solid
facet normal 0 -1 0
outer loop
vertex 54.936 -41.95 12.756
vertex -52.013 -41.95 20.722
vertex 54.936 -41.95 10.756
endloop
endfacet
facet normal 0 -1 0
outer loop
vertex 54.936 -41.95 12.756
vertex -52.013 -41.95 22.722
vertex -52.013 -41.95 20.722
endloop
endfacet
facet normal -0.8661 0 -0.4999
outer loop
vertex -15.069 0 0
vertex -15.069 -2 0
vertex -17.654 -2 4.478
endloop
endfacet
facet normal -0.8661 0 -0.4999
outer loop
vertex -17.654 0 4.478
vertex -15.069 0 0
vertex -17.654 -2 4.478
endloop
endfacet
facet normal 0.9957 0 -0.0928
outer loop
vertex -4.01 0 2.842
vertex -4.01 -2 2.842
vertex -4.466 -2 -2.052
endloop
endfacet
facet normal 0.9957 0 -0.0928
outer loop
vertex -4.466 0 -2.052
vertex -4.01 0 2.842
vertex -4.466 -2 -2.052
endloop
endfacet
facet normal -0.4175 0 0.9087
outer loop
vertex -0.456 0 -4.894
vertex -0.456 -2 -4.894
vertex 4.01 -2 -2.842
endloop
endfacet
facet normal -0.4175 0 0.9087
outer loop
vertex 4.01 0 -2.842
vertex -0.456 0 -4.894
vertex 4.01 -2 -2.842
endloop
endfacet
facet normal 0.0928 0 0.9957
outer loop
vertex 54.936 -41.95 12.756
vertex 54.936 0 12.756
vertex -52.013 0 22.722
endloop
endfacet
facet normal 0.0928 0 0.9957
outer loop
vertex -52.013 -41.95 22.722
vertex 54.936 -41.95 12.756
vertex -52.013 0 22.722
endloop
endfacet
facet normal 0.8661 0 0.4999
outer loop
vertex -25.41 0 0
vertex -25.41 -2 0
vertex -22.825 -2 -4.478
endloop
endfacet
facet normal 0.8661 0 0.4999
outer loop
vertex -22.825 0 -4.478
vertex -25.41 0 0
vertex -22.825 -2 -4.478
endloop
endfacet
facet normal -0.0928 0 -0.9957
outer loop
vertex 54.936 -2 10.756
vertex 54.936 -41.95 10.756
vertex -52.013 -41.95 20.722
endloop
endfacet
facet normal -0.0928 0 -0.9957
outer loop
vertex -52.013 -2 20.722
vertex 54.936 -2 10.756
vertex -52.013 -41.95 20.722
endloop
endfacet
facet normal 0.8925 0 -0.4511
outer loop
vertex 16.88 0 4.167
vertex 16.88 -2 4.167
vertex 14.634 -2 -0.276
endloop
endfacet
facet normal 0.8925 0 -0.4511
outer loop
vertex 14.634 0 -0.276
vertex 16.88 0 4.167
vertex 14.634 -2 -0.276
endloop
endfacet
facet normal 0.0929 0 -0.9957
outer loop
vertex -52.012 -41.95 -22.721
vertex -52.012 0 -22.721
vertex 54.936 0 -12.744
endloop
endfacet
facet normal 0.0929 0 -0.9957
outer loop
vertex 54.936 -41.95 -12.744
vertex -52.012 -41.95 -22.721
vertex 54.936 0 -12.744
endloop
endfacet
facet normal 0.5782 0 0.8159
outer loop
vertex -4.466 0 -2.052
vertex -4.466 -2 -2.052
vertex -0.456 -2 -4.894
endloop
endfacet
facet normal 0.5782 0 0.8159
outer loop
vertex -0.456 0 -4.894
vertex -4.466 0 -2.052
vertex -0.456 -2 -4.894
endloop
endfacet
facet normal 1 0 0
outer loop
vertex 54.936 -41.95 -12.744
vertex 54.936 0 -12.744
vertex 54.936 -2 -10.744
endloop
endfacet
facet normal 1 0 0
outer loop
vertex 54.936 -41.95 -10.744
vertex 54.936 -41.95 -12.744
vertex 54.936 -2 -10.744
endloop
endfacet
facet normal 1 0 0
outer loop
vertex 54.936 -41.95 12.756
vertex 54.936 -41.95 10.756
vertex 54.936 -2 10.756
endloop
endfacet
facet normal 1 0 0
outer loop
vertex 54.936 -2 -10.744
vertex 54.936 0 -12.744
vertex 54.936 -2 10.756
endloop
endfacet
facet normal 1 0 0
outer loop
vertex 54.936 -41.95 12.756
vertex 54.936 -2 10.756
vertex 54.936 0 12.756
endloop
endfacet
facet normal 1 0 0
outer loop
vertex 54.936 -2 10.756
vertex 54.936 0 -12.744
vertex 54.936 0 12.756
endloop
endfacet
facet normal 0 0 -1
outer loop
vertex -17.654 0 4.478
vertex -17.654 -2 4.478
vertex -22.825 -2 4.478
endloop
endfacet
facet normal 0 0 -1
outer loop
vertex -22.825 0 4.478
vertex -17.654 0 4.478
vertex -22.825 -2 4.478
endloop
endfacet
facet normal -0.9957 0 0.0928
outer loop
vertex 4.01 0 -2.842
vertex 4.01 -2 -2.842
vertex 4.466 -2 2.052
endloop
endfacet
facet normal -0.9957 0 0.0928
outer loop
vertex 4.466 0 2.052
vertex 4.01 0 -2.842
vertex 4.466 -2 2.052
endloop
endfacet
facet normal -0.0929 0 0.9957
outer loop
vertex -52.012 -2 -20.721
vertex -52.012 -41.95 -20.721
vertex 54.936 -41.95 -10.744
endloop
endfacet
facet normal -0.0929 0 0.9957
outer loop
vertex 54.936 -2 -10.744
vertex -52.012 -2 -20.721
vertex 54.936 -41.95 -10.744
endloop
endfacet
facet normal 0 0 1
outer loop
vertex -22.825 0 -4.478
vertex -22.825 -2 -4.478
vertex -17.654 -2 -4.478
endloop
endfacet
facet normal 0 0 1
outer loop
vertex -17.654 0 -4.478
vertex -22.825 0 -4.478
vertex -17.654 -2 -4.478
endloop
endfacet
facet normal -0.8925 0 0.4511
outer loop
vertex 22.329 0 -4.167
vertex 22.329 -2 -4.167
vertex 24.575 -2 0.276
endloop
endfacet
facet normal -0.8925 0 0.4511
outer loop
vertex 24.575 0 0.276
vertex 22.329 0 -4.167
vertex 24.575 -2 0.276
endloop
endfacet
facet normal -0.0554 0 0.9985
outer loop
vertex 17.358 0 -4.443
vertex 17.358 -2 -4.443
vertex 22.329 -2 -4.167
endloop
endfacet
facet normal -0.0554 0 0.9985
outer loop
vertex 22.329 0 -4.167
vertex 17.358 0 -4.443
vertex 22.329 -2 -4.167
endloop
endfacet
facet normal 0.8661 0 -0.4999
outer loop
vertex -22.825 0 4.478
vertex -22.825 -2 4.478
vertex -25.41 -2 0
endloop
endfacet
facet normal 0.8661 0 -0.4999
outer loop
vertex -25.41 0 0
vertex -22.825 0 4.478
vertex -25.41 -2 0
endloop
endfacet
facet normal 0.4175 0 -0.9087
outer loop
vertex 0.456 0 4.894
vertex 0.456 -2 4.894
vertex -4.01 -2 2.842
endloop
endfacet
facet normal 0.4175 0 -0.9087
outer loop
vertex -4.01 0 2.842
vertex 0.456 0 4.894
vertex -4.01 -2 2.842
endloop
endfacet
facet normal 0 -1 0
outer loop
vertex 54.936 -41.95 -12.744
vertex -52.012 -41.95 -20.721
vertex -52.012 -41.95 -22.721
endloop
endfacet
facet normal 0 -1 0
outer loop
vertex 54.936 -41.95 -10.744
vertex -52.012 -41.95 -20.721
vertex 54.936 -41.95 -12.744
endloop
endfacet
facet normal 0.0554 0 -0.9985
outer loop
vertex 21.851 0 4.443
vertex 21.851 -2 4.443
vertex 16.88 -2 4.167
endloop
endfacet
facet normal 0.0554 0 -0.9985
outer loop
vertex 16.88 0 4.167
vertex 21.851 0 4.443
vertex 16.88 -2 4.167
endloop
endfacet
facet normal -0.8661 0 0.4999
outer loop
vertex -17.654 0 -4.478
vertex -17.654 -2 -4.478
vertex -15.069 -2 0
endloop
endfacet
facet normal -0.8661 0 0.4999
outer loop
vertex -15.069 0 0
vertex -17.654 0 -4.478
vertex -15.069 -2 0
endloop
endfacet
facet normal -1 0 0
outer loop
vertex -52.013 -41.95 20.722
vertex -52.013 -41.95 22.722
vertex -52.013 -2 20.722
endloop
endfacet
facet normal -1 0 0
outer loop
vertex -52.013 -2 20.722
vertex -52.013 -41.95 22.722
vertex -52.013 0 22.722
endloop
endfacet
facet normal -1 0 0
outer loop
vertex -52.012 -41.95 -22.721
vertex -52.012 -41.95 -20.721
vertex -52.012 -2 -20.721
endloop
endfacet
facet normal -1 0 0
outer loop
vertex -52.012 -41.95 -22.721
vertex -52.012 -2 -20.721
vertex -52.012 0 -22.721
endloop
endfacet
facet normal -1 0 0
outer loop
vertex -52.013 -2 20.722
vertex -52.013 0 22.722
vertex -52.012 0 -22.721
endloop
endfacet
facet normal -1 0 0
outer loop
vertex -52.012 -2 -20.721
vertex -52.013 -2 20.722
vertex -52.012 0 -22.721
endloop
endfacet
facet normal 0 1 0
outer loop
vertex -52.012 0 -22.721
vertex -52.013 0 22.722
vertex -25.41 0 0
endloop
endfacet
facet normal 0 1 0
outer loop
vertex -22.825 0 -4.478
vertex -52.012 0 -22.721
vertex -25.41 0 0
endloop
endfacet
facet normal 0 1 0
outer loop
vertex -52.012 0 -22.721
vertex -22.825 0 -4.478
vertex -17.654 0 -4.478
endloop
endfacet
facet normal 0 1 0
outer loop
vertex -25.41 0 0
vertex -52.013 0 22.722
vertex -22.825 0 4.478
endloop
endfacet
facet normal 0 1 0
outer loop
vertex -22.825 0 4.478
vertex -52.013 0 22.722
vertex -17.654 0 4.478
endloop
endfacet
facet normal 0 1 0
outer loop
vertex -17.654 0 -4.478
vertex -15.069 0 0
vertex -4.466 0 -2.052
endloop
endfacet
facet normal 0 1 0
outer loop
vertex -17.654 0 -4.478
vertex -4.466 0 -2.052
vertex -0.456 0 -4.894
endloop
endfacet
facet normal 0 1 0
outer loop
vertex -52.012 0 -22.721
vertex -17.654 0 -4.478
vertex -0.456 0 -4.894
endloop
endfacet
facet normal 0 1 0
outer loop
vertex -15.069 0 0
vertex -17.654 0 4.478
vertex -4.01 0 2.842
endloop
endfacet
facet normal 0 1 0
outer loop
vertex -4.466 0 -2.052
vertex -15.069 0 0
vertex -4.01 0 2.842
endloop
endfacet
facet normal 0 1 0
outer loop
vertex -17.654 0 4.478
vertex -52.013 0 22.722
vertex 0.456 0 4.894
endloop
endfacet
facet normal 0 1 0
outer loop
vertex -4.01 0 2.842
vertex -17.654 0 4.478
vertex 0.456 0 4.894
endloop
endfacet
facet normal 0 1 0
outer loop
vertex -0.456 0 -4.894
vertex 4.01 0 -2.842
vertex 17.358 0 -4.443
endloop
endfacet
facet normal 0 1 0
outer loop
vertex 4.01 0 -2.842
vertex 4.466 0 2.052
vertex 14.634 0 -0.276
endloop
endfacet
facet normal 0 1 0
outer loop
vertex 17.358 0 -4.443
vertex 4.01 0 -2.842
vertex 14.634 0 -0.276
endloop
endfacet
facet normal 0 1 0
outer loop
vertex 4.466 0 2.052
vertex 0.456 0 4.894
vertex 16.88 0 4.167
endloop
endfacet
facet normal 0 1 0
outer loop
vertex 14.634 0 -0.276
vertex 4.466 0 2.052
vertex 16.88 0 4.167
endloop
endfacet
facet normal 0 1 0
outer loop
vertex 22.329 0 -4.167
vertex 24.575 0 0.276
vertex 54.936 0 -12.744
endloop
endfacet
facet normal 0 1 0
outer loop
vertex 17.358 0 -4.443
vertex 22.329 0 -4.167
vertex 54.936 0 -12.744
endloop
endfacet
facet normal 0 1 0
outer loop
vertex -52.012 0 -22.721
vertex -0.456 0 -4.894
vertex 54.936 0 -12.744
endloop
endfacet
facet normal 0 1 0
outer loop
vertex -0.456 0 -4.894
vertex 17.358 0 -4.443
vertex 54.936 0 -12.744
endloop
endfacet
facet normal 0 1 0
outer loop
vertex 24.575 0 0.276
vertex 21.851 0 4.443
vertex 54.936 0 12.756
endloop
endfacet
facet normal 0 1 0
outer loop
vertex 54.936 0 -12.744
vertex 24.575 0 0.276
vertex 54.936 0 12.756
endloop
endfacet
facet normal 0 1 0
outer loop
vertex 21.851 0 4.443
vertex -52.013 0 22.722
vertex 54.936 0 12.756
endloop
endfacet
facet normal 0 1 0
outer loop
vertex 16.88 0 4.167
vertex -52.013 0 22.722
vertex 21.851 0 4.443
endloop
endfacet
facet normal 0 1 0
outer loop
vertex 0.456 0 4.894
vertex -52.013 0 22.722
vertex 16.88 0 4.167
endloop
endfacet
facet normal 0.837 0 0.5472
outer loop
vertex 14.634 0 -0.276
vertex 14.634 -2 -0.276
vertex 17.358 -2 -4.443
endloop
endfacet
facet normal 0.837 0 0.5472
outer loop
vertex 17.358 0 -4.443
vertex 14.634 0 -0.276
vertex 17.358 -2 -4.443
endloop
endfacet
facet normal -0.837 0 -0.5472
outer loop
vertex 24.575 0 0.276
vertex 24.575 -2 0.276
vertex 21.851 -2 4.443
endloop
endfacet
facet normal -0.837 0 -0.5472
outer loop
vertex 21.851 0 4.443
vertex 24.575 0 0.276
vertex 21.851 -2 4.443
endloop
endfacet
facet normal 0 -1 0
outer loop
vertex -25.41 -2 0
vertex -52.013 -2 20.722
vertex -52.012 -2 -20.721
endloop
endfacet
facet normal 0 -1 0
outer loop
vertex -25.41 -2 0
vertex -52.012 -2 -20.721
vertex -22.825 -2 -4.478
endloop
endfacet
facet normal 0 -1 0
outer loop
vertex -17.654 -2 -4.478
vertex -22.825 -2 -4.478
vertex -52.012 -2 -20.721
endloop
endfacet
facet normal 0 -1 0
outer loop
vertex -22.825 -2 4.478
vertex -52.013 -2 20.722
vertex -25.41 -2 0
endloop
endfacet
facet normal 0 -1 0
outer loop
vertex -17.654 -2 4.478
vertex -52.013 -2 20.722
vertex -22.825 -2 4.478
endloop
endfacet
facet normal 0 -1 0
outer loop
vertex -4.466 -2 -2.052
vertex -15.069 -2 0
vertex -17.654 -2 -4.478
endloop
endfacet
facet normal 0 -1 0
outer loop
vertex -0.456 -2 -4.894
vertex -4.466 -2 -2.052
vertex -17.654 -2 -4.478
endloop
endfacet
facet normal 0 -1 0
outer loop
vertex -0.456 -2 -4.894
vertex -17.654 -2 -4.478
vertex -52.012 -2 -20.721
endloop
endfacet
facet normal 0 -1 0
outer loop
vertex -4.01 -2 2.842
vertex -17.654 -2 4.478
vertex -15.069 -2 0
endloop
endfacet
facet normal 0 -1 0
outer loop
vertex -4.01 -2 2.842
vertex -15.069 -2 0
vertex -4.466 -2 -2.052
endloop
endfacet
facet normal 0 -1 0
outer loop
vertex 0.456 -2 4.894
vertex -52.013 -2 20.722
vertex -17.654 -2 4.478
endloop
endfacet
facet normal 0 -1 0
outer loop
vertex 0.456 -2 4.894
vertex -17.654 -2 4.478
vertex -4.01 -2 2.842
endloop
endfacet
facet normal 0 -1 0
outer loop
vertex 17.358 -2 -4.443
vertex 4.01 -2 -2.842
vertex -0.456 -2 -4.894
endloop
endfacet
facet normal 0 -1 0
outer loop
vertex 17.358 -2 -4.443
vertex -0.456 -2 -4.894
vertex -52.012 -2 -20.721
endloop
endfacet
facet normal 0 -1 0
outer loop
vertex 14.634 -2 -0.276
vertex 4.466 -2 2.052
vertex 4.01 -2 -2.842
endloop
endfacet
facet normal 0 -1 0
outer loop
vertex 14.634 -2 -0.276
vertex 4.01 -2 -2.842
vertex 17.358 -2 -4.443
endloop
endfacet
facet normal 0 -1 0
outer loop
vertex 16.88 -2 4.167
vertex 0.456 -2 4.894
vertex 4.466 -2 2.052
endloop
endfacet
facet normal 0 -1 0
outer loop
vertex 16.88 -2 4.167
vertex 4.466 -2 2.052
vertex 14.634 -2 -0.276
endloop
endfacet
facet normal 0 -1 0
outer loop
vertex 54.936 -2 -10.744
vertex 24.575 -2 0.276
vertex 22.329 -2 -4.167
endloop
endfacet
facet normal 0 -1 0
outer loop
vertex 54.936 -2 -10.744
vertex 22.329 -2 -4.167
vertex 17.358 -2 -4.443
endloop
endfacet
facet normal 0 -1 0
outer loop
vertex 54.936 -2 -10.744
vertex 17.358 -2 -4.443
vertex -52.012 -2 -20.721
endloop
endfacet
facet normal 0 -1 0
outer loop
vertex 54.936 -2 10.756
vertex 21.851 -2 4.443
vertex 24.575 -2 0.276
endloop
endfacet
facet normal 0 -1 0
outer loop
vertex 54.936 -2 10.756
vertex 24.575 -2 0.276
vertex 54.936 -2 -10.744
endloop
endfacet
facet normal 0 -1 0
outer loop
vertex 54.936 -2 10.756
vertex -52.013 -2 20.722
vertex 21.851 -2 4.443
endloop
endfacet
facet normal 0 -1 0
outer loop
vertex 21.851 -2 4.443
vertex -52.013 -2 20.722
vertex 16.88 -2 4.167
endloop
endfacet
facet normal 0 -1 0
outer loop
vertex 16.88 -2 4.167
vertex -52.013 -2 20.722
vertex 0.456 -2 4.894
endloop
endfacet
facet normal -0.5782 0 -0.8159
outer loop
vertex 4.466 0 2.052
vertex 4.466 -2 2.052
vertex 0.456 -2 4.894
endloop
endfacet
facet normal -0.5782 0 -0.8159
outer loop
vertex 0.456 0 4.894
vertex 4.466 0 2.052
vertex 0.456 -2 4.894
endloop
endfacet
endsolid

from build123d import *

# Parameters (mm, degrees)
F1_DEPTH = 41.95
F3_DEPTH = 39.95
F5_DEPTH = 5


with BuildPart() as f1:
    # F0 (on Front) → F1 (new body)
    with BuildSketch(Plane.XZ):
        Polygon((54.9357536622, -12.7440134094), (54.9357536622, 0.0059865906), (54.9357536622, 12.7559865906), (-52.01294007, 22.7216603247), (-52.0118536268, -22.7213396623), align=None)
    extrude(amount=F1_DEPTH)

    # F2 (on face) → F3 (cut)
    with BuildSketch(Plane.XZ.offset(41.95)):
        Polygon((54.9357536622, 10.7559865906), (-52.0128922544, 20.7216603253), (-52.0119014425, -20.7213396629), (54.9357536622, -10.7440134094), align=None)
    extrude(amount=-F3_DEPTH, mode=Mode.SUBTRACT)

    # F4 (on face) → F5 (cut)
    with BuildSketch(Plane.XZ.offset(2)):
        Polygon((-17.6542899587, 4.4775479473), (-22.824516984, 4.4775479473), (-25.4096304967, 0), (-22.824516984, -4.4775479473), (-17.6542899587, -4.4775479473), (-15.069176446, 0), align=None)
        Polygon((4.0099493481, -2.841678097), (4.4659400954, 2.0518789548), (0.4559907474, 4.8935570518), (-4.0099493481, 2.841678097), (-4.4659400954, -2.0518789548), (-0.4559907474, -4.8935570518), align=None)
        Polygon((24.5754495263, 0.2760817257), (21.8509733677, 4.442849405), (16.8802086264, 4.1667676794), (14.6339200437, -0.2760817257), (17.3583962023, -4.442849405), (22.3291609436, -4.1667676794), align=None)
    extrude(amount=-F5_DEPTH, mode=Mode.SUBTRACT)


solid = f1.part
